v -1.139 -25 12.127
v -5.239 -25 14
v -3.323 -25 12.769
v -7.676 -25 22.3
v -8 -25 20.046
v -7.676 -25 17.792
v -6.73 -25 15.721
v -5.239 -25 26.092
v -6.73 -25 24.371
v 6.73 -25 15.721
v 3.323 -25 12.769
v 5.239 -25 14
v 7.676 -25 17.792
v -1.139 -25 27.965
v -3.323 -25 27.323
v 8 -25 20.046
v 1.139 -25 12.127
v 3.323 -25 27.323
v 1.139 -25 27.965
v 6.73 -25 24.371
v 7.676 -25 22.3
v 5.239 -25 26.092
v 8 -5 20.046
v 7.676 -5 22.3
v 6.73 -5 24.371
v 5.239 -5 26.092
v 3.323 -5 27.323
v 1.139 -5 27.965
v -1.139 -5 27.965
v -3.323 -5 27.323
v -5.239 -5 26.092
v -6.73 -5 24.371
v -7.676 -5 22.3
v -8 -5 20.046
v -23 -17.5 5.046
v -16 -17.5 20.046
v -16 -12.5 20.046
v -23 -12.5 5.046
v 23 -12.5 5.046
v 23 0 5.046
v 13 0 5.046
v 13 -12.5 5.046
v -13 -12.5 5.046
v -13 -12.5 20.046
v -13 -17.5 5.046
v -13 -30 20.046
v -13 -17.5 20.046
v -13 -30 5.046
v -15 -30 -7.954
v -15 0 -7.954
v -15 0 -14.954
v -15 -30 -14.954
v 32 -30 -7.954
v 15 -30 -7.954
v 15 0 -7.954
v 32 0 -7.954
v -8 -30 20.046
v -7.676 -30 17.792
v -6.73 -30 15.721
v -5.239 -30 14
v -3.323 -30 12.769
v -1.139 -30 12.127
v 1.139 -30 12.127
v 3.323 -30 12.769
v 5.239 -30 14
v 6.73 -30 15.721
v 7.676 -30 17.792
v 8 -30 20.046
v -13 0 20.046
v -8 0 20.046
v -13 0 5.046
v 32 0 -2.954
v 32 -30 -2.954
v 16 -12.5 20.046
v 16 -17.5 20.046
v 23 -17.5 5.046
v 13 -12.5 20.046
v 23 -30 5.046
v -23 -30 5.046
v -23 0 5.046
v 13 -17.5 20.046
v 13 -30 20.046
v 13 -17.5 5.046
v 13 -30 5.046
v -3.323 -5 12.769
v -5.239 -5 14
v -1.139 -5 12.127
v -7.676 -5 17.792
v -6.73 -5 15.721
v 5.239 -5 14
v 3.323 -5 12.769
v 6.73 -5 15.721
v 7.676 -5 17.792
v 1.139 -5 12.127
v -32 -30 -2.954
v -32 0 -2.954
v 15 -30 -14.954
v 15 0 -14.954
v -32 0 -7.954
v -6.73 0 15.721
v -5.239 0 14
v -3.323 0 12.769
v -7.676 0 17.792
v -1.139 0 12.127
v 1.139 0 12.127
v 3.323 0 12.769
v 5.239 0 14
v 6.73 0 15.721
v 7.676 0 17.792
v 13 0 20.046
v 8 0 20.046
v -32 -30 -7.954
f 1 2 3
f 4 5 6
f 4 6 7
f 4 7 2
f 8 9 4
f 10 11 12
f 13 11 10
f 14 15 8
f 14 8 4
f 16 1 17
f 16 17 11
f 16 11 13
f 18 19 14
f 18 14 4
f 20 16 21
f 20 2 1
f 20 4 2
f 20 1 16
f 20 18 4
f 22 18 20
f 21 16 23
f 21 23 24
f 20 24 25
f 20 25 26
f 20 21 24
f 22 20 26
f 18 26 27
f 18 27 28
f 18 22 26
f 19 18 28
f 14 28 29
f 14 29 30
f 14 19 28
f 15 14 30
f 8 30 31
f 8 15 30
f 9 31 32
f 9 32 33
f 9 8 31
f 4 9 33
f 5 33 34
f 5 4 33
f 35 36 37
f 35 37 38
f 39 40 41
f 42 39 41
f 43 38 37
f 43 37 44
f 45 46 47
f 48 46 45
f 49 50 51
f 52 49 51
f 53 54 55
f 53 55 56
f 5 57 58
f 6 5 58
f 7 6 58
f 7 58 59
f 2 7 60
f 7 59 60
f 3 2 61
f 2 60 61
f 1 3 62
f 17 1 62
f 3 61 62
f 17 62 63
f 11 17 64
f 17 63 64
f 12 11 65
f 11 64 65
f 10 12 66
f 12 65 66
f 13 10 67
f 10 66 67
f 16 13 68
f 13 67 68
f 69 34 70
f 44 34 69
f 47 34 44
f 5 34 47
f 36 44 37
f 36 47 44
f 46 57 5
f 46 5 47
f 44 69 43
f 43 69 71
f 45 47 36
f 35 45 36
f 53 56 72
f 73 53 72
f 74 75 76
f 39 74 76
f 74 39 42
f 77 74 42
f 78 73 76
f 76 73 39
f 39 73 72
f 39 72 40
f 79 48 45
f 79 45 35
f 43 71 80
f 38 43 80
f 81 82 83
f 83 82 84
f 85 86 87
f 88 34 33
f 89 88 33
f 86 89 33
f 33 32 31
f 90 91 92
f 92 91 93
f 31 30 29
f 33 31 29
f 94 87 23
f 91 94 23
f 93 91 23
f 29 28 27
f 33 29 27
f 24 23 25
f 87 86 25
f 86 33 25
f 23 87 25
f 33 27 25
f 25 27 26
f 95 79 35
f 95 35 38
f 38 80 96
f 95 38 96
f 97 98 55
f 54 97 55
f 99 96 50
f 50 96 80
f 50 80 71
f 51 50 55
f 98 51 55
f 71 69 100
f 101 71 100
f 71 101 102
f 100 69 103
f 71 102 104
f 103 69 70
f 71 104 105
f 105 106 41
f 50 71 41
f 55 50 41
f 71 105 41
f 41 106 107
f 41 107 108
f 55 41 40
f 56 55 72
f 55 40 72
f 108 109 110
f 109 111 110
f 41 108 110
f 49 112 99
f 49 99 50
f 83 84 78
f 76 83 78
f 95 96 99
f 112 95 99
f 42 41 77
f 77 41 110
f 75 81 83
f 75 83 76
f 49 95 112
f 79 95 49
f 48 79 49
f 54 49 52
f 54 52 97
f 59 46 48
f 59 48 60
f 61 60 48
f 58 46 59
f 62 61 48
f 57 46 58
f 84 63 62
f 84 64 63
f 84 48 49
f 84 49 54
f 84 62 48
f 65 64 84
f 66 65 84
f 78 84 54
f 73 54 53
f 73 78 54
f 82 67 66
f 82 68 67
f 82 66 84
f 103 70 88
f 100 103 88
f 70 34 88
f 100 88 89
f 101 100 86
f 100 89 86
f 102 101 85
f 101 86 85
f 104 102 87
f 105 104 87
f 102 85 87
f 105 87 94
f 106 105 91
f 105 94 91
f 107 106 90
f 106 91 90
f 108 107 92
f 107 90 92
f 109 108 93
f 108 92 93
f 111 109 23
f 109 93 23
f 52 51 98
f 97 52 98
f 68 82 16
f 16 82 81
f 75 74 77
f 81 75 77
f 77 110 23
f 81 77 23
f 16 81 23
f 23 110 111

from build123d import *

# Parameters (mm, degrees)
PAD_DEPTH       = 30
SKETCH002_R     = 8
POCKET_DEPTH    = 30
SKETCH003_R     = 8
PAD001_DEPTH    = 25
SKETCH004_R     = 8
POCKET001_DEPTH = 5
PAD002_DEPTH    = 17.5
POCKET002_DEPTH = 12.5


with BuildPart() as part:
    # Sketch → Pad (new body)
    with BuildSketch(Plane.XZ):
        Polygon((-15, -14.95402), (15, -14.95402), (15, -7.95402), (32, -7.95402), (32, -2.95402), (23, 5.04598), (13, 5.04598), (13, 20.04598), (-13, 20.04598), (-13, 5.04598), (-23, 5.04598), (-32, -2.95402), (-32, -7.95402), (-15, -7.95402), align=None)
    extrude(amount=PAD_DEPTH)

    # Sketch002 (on Face16 of Pad) → Pocket (cut)
    with BuildSketch(Plane.XZ.offset(30)):
        with Locations((0, 20.04598)):
            Circle(SKETCH002_R)
    extrude(amount=-POCKET_DEPTH, mode=Mode.SUBTRACT)

    # Sketch003 (on Face5 of Pocket) → Pad001 (join)
    with BuildSketch(Plane.XZ.offset(30)):
        with Locations((0, 20.04598)):
            Circle(SKETCH003_R)
    extrude(amount=-PAD001_DEPTH)

    # Sketch004 (on Face20 of Pad001) → Pocket001 (cut)
    with BuildSketch(Plane.XZ.offset(30)):
        with Locations((0, 20.04598)):
            Circle(SKETCH004_R)
    extrude(amount=-POCKET001_DEPTH, mode=Mode.SUBTRACT)

    # Sketch005 (on Face5 of Pocket001) → Pad002 (join)
    with BuildSketch(Plane.XZ.offset(30)):
        Polygon((-23, 5.04598), (-13, 5.04598), (-13, 20.04598), (-16, 20.04598), align=None)
        Polygon((23, 5.04598), (13, 5.04598), (13, 20.04598), (16, 20.04598), align=None)
    extrude(amount=-PAD002_DEPTH)

    # Sketch006 (on Face24 of Pad002) → Pocket002 (cut)
    with BuildSketch(Plane.XZ.offset(30)):
        Polygon((-23, 5.04598), (-16, 20.04598), (-13, 20.04598), (-13, 5.04598), align=None)
        Polygon((23, 5.04598), (16, 20.04598), (13, 20.04598), (13, 5.04598), align=None)
    extrude(amount=-POCKET002_DEPTH, mode=Mode.SUBTRACT)


solid = part.part
